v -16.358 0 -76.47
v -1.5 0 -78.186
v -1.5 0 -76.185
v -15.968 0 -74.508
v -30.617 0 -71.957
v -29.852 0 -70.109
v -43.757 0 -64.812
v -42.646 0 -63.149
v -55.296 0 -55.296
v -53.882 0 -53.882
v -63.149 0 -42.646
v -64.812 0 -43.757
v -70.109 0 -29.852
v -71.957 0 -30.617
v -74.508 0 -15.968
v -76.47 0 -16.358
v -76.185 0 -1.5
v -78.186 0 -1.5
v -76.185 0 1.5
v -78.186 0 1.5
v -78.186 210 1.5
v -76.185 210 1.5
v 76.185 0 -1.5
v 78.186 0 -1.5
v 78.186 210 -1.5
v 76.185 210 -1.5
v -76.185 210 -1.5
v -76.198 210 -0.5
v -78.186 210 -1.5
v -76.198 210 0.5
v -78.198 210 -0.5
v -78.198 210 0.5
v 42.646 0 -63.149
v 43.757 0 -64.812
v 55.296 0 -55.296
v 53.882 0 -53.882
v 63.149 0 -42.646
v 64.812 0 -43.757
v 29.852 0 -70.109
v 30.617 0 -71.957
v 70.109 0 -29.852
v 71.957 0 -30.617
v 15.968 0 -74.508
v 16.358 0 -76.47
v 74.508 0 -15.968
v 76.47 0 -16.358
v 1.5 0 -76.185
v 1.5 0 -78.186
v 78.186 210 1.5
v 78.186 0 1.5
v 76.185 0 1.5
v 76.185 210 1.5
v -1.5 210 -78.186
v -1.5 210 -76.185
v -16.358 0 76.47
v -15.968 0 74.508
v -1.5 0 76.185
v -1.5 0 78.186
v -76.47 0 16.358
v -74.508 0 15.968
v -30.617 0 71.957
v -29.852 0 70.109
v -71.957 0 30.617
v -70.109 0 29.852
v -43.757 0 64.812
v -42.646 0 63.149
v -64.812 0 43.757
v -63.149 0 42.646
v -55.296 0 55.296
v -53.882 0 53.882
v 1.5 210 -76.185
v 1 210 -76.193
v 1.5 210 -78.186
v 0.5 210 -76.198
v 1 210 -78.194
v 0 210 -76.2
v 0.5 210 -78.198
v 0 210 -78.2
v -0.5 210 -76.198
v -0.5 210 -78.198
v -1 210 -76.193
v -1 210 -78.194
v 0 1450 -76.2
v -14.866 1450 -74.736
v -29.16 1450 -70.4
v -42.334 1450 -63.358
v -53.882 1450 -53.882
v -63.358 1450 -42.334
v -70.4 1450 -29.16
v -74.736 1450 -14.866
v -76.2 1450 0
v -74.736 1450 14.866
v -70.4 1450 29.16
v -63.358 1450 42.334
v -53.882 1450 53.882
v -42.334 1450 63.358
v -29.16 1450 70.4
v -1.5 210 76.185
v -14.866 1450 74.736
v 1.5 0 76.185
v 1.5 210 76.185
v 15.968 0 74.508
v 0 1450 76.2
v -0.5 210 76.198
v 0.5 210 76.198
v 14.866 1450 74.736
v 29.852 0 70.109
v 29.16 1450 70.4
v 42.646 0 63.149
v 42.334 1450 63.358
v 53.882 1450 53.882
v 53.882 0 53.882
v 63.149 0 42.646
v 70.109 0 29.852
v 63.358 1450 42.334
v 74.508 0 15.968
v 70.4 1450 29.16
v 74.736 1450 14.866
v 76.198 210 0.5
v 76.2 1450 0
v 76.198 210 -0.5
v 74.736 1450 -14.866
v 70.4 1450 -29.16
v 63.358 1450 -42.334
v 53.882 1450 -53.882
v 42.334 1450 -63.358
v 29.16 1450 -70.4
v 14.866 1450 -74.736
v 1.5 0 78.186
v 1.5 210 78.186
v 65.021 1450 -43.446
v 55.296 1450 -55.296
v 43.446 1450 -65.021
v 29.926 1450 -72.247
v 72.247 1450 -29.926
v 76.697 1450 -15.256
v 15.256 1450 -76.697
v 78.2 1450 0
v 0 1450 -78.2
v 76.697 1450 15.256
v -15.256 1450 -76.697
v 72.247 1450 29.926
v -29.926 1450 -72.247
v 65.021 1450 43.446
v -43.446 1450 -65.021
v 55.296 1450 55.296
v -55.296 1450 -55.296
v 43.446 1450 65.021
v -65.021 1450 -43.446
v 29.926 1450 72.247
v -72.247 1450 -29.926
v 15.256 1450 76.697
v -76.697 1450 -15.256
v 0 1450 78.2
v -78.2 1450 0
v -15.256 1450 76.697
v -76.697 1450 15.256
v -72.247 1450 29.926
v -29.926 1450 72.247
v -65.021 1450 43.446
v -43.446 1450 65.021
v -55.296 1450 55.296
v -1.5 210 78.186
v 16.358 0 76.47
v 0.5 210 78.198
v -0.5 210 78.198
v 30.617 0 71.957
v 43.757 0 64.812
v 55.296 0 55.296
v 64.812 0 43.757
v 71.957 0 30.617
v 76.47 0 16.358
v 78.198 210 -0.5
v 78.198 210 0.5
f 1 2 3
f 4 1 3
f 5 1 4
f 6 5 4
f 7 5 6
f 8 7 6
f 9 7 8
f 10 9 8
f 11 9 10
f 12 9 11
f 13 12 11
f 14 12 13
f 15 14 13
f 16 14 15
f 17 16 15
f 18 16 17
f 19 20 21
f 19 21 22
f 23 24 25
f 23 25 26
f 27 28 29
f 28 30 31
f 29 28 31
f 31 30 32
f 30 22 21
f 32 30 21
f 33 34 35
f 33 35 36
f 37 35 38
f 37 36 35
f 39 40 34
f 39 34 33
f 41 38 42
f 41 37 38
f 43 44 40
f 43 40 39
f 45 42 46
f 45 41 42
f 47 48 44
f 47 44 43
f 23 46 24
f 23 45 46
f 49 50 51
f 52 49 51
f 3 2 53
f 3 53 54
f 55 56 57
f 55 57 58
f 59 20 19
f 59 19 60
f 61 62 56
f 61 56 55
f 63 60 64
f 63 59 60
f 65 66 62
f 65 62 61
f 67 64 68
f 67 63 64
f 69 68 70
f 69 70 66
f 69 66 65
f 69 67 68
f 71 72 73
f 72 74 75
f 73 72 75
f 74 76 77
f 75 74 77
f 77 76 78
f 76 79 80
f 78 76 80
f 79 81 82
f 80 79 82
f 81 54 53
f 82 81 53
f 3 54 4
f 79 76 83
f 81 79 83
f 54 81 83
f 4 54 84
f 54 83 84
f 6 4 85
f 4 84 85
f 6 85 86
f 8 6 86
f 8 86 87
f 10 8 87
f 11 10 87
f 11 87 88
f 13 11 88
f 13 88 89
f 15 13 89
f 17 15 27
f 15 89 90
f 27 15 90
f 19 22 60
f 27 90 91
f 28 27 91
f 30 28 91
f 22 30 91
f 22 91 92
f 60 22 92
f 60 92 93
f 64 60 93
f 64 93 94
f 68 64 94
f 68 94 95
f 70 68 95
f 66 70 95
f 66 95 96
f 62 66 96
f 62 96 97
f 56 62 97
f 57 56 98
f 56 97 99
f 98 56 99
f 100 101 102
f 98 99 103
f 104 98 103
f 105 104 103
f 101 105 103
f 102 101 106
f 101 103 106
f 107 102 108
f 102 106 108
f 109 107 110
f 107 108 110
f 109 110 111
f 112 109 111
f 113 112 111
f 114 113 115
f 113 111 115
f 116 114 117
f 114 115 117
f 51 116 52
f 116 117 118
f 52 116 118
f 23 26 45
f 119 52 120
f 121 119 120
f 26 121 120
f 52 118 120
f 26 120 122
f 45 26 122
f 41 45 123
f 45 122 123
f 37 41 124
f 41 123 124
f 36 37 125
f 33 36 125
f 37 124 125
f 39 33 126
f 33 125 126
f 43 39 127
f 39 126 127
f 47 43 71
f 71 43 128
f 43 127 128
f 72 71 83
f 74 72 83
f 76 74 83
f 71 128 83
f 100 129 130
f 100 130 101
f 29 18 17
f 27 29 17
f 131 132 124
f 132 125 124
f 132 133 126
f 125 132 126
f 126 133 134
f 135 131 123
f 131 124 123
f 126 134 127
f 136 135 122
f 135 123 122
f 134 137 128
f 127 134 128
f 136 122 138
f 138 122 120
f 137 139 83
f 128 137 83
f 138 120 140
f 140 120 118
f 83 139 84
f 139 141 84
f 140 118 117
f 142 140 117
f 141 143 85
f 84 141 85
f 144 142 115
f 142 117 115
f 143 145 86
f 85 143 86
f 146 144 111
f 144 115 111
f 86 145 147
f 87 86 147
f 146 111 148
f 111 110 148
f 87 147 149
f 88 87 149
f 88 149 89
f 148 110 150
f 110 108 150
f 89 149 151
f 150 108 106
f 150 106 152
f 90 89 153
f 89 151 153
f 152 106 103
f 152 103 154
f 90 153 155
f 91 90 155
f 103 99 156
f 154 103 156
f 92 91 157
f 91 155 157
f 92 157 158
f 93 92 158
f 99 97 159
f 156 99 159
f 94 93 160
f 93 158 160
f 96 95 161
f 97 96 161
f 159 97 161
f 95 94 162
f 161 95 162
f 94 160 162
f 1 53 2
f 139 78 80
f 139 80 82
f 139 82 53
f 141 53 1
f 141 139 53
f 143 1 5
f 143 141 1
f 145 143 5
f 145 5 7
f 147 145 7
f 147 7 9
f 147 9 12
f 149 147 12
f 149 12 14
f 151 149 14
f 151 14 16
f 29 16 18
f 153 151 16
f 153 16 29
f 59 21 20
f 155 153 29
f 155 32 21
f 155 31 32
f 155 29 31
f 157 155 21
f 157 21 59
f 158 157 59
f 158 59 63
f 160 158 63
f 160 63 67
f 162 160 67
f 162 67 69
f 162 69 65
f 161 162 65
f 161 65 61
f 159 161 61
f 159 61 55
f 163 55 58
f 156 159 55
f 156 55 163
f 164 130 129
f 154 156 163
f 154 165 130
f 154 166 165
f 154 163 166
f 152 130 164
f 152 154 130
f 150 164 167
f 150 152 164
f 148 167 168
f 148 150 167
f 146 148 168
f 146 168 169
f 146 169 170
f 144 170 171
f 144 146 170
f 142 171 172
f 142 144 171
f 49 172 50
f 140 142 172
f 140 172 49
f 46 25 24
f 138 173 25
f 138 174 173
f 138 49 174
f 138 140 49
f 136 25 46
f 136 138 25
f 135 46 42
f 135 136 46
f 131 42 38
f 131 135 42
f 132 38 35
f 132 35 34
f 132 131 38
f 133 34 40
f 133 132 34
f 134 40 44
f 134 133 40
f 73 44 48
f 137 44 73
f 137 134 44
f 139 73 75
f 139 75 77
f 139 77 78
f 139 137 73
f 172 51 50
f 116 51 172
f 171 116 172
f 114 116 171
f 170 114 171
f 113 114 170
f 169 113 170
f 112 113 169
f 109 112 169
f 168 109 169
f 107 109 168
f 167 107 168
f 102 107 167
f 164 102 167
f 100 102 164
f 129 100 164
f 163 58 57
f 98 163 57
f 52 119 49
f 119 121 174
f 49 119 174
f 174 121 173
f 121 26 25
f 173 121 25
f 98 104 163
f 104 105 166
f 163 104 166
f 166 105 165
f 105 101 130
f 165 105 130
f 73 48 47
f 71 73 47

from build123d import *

# Parameters (mm, degrees)
SKETCH1_W          = 2
SKETCH1_H          = 1450
CUT_EXTRUDE1_DEPTH = 1.5
CIRPATTERN1_COUNT  = 4


with BuildPart() as part:
    # Sketch1 → Revolve1 (revolve)
    with BuildSketch(Plane.XY):
        with Locations((77.2, 725)):
            Rectangle(SKETCH1_W, SKETCH1_H)
    revolve(axis=Axis((0, 0, 0), (0, 1, 0)))

    # Sketch2 → Cut-Extrude1 (cut, symmetric)
    with BuildSketch(Plane.XY):
        Polygon((-185.2, 150), (-185.2, 0), (-78.2, 0), (0, 0), (0, 210), (-78.2, 210), align=None)
    cut_extrude1 = extrude(amount=CUT_EXTRUDE1_DEPTH, both=True, mode=Mode.SUBTRACT)

    # CirPattern1: Cut-Extrude1 ×4 about axis
    cirpattern1_axis = Axis((0, 0, 0), (0, -1, 0))
    for i in range(1, CIRPATTERN1_COUNT):
        add(cut_extrude1.rotate(cirpattern1_axis, i * 360 / CIRPATTERN1_COUNT), mode=Mode.SUBTRACT)


solid = part.part
